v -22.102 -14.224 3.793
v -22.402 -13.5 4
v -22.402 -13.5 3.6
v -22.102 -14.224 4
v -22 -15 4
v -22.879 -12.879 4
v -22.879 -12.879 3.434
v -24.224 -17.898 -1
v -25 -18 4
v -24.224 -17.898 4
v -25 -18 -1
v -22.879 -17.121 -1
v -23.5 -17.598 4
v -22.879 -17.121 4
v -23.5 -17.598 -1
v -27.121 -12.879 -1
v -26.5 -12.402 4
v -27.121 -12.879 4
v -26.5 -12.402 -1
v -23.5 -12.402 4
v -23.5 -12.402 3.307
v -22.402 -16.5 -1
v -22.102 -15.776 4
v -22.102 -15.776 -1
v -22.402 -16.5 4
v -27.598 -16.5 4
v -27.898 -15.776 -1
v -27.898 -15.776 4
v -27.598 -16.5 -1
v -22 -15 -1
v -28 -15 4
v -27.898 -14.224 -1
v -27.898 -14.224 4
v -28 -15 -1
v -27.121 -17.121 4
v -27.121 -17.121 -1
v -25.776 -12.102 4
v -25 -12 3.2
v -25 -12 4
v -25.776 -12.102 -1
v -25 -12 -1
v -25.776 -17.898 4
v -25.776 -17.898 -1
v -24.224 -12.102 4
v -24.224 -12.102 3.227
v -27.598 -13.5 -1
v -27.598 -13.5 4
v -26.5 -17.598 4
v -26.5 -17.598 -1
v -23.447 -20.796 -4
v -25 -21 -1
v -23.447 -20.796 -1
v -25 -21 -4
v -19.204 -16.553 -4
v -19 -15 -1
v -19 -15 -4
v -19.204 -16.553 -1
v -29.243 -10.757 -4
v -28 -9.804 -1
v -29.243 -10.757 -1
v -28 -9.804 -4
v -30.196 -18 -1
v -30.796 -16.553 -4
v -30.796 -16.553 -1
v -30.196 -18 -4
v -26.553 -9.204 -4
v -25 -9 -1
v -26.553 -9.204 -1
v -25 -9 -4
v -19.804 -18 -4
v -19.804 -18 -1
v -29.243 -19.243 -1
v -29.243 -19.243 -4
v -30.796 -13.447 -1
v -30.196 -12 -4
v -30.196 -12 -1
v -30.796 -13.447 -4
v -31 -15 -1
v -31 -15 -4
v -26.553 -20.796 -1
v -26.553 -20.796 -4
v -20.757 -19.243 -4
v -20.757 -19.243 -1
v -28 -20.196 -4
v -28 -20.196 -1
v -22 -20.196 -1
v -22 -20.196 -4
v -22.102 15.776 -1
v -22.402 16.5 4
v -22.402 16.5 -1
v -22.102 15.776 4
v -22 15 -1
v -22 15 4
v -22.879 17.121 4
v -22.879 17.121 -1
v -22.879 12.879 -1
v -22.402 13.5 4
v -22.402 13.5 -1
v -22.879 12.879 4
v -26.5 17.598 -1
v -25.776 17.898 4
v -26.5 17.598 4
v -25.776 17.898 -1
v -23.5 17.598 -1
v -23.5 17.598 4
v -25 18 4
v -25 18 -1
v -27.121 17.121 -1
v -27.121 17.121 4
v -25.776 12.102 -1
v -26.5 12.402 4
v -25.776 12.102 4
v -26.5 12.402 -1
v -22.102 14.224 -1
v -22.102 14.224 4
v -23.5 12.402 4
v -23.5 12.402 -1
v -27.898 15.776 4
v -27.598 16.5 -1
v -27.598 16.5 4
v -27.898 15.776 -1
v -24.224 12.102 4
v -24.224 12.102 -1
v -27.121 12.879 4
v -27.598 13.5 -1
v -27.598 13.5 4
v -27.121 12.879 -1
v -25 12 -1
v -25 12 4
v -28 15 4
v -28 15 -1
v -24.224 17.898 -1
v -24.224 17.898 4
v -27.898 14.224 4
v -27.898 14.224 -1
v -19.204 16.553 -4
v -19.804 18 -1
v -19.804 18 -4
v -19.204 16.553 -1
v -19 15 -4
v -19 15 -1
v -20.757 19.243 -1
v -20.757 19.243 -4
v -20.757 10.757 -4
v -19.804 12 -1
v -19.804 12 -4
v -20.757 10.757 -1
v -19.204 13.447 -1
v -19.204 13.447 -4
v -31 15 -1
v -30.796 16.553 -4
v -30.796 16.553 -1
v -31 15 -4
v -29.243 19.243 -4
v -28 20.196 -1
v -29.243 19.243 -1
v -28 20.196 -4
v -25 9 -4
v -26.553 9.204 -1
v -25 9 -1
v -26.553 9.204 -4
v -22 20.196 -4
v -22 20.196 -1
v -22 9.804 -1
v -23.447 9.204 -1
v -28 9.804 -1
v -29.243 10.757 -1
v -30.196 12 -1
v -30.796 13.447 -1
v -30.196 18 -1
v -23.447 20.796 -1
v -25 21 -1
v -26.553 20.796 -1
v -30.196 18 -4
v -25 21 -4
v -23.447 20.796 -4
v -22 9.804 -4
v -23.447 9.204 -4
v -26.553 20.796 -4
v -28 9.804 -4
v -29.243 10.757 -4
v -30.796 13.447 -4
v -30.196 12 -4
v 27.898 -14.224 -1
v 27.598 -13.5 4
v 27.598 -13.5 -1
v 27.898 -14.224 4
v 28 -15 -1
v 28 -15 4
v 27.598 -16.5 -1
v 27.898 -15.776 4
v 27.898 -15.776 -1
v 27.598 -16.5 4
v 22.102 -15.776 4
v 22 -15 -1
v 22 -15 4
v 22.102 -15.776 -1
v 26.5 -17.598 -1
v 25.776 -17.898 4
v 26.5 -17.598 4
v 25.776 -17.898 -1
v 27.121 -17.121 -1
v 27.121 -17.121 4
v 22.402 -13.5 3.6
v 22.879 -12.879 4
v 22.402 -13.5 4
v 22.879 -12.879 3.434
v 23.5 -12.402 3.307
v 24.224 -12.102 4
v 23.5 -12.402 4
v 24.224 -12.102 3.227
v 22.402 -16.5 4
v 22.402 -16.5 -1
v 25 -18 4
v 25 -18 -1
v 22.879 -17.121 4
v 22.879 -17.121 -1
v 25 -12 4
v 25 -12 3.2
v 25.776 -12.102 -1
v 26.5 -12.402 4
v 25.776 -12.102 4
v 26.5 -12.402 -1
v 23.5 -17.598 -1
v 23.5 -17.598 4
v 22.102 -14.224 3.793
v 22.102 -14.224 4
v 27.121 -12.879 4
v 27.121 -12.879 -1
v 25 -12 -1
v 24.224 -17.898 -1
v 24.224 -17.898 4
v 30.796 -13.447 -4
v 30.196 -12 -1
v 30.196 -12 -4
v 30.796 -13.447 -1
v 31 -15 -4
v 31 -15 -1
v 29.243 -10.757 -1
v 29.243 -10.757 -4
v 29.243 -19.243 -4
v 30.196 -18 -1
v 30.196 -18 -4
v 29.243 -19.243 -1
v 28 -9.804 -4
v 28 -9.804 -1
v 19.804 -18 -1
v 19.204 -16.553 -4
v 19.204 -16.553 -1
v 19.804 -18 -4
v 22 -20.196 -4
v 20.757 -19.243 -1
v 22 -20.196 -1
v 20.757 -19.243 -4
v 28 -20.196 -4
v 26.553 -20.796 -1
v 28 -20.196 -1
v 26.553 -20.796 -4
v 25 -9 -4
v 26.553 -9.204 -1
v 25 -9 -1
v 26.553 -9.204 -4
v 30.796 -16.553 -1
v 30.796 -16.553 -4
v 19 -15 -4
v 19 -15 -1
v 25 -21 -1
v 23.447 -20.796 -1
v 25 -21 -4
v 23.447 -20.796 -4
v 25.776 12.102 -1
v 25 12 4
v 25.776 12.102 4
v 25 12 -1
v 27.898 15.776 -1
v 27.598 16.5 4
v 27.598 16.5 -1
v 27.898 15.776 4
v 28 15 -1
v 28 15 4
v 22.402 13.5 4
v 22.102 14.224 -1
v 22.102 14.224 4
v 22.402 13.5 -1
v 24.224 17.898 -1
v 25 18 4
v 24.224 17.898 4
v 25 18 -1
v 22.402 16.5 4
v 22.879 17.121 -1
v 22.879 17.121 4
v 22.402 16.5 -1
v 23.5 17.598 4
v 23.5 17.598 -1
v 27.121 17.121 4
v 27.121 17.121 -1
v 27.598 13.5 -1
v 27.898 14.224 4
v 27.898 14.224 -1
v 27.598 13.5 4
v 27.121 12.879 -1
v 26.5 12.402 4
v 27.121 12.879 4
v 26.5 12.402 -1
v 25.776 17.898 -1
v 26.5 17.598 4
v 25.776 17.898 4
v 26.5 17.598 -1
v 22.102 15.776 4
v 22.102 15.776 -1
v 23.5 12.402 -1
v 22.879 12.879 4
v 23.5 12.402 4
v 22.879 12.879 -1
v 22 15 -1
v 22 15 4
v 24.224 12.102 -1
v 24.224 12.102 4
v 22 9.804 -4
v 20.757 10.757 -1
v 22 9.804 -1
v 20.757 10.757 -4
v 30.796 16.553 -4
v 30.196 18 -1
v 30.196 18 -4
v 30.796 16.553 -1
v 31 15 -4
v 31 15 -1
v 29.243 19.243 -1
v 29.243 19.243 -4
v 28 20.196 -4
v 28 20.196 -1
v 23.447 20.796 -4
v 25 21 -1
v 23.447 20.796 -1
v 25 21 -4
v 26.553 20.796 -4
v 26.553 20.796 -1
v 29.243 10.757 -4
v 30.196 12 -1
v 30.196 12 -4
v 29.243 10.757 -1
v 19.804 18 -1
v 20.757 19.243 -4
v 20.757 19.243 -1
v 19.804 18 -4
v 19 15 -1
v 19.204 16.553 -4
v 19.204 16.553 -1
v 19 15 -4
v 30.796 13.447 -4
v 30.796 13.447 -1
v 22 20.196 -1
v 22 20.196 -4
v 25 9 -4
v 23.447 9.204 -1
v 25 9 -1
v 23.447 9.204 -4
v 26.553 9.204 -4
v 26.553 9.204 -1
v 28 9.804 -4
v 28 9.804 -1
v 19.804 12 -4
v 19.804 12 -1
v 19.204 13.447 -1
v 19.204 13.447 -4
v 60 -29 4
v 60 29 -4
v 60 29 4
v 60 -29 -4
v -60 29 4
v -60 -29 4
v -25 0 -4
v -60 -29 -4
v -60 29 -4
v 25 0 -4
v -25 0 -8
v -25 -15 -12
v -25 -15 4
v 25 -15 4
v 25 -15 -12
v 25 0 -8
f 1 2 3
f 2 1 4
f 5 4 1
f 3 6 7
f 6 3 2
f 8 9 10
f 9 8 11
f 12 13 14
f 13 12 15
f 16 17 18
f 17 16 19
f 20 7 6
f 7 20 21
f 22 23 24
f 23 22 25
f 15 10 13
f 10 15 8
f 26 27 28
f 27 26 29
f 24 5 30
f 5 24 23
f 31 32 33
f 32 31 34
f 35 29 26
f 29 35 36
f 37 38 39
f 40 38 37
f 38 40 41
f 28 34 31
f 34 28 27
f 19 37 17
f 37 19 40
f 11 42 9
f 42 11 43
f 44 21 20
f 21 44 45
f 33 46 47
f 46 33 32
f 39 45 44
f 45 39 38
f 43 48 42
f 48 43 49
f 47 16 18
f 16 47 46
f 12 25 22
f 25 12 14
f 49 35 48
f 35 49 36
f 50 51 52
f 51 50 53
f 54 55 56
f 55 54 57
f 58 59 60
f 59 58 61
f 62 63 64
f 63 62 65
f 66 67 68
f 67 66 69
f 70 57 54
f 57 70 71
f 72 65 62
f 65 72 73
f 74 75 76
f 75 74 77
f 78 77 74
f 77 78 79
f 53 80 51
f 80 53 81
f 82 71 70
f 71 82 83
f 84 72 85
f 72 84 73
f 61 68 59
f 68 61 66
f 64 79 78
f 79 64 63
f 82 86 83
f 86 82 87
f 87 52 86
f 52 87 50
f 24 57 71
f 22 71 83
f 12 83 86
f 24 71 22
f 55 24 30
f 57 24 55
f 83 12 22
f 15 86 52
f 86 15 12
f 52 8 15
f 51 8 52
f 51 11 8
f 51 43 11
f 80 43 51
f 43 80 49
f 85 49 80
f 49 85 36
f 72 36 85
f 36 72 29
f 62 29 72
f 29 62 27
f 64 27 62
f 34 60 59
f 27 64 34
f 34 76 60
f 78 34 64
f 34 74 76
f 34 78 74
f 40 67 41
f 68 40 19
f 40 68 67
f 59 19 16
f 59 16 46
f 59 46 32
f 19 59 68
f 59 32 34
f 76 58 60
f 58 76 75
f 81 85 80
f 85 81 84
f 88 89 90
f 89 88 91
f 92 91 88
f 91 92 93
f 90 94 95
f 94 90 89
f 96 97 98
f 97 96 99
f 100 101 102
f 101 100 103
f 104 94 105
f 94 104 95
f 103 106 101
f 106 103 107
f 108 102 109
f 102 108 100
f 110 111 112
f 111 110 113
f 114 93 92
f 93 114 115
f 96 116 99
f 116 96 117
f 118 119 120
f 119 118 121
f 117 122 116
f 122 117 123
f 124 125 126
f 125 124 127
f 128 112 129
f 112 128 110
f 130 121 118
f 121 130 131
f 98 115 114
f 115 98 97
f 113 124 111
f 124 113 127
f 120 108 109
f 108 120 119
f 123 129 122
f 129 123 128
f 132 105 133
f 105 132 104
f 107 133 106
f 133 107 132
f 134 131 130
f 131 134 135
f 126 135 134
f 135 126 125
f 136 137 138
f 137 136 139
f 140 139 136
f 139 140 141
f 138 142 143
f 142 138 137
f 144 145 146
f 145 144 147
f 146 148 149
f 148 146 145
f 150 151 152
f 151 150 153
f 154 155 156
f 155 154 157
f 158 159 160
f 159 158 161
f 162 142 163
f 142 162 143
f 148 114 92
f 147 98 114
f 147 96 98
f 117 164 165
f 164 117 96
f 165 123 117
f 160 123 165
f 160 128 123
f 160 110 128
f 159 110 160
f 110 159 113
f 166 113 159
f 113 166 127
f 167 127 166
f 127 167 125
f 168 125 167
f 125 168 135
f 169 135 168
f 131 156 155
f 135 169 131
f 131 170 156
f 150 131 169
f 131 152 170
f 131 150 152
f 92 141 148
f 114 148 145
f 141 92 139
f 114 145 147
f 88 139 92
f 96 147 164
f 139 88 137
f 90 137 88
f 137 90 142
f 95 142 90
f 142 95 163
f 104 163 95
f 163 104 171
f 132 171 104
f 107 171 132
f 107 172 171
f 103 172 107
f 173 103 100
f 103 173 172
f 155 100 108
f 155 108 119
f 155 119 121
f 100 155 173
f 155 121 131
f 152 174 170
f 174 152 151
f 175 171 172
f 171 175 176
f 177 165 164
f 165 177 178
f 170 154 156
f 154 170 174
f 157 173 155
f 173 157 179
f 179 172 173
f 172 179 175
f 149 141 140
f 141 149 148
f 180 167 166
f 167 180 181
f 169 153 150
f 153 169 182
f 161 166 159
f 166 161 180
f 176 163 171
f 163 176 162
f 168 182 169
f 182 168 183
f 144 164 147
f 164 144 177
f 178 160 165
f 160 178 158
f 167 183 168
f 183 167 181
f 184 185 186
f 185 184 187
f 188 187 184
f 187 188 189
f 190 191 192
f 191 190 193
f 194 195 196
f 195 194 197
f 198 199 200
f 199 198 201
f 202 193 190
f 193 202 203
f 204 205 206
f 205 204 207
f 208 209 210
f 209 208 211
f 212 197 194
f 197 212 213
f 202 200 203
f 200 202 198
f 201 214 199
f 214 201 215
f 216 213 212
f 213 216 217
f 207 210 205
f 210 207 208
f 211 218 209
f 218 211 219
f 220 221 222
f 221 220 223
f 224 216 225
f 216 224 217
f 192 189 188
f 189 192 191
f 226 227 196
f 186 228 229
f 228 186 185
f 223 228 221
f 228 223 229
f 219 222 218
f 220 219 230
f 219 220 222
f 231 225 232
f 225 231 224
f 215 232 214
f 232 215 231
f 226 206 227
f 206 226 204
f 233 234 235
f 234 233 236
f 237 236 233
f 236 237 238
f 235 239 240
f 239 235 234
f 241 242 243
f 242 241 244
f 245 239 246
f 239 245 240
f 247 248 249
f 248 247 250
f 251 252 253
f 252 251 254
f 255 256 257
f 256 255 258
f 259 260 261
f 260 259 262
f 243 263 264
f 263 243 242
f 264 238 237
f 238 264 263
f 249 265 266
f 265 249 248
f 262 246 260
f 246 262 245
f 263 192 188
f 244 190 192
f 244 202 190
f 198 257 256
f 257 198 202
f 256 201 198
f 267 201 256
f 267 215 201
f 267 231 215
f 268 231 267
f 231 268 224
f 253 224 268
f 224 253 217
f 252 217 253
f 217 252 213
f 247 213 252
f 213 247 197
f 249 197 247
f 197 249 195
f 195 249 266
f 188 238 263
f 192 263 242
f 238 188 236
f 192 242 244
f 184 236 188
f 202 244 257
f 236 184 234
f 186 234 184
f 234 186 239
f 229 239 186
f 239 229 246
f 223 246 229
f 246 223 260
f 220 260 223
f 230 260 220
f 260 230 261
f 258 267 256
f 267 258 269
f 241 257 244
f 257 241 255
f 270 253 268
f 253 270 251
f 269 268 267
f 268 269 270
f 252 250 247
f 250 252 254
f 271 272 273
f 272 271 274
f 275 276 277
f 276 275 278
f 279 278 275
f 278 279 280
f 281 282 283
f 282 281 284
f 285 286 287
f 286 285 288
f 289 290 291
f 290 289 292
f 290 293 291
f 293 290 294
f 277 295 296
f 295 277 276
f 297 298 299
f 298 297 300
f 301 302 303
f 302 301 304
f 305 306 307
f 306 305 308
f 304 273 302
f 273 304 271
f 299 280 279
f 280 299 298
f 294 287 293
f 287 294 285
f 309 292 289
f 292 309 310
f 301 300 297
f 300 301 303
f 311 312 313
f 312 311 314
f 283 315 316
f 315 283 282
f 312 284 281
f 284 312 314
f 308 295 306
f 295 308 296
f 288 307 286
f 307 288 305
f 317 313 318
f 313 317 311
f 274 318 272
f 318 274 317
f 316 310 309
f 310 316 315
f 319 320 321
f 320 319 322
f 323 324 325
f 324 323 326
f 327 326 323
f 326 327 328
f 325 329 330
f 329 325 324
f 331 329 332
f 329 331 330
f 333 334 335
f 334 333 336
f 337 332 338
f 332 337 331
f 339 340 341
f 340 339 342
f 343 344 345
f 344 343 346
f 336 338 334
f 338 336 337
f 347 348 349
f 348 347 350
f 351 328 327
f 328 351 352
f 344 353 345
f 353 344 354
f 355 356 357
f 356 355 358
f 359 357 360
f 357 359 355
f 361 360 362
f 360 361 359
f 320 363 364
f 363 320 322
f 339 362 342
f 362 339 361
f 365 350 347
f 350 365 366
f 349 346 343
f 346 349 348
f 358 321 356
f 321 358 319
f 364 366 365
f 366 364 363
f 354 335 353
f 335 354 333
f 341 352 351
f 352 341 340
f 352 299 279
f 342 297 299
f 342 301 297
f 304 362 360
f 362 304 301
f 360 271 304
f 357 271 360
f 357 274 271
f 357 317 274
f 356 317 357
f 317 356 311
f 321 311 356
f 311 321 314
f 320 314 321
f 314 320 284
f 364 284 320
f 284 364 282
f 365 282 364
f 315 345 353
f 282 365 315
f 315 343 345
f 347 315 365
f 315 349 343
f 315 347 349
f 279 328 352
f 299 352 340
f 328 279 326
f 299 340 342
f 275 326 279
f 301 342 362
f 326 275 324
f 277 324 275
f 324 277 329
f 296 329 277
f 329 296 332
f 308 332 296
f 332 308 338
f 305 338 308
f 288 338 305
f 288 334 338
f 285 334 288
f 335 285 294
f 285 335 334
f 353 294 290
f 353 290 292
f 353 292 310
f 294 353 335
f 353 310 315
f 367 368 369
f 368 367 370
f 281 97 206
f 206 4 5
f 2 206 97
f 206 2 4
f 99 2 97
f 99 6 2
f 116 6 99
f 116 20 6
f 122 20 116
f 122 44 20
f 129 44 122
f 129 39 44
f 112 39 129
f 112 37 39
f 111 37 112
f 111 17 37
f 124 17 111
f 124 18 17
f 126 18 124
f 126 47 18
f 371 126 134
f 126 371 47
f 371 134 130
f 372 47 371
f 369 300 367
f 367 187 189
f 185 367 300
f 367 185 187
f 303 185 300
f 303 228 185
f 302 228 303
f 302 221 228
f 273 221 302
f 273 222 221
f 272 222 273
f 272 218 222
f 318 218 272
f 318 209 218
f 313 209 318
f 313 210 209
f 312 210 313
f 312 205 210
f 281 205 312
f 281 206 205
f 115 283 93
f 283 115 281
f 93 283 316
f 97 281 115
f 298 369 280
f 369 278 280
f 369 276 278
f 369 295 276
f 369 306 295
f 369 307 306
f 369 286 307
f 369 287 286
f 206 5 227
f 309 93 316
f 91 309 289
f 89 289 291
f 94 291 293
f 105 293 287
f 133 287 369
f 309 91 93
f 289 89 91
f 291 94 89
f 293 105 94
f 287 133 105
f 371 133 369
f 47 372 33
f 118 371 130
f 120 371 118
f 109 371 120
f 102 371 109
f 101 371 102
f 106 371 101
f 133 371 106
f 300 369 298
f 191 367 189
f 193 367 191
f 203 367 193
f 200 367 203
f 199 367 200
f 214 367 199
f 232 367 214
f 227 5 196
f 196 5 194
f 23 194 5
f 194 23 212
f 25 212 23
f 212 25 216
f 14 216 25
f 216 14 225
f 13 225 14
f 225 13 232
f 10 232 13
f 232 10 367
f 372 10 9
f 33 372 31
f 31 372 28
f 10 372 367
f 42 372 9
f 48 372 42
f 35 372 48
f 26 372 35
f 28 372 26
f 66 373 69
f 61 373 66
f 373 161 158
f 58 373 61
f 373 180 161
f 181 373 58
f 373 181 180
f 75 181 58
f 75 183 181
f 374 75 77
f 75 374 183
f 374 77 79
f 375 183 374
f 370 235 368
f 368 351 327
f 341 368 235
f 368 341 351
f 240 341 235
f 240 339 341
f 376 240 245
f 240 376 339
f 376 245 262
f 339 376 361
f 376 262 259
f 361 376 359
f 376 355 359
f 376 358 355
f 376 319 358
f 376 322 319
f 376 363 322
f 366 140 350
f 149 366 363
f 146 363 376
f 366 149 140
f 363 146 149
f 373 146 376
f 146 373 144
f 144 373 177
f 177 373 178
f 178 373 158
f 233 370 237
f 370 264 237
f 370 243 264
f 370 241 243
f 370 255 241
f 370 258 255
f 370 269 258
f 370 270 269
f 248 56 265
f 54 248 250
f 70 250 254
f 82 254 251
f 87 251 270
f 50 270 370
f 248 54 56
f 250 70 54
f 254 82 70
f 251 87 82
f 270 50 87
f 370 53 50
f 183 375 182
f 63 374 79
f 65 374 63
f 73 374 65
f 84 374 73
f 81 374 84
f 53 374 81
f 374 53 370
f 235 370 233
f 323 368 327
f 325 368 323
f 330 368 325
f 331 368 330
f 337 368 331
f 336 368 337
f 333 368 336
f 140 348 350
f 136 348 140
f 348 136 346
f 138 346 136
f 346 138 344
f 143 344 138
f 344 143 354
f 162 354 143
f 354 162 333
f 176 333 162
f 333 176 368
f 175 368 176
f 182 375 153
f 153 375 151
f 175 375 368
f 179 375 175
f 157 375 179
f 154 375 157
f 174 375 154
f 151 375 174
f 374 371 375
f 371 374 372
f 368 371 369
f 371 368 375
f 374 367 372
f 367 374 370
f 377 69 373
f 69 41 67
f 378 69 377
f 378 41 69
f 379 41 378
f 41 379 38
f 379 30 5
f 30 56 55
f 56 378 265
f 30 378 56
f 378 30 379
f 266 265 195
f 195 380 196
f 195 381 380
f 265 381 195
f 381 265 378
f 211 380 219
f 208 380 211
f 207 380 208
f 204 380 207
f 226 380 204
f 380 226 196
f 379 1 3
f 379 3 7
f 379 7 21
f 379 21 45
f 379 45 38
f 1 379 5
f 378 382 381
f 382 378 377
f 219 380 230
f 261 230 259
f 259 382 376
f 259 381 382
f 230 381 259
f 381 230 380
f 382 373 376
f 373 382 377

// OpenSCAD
// ===== PARAMETERS =====

// Mounting plate dimensions
plate_length = 120;        // Length of bracket plate (X)
plate_width = 58;          // Width of bracket plate (Y)
plate_thickness = 8;       // Thickness of plate (Z)

// Screw hole pattern
hole_pattern_length = 50;  // X distance between holes
hole_pattern_width = 30;   // Y distance between holes
hole_diameter = 6;         // Hole diameter
nut_recess_diameter = 12;  // Nut head recess diameter
screw_material = 5;        // Material for screw threads

// Dovetail dimensions
dovetail_length = 50;      // Length of dovetail rail - how far to slide on (along Y)
dovetail_top_width = 8;    // Width at top (narrow, attached to plate)
dovetail_bottom_width = 16; // Width at bottom (wide, the catch)
dovetail_height = 15;      // How far dovetail drops below plate

// Rendering
$fn = 32;

// ===== HELPERS =====
function hole_offset_x() = hole_pattern_length / 2;
function hole_offset_y() = hole_pattern_width / 2;

// ===== MODULES =====

// Dovetail profile (2D) - trapezoidal cross-section
// X = drop distance (becomes -Z after rotation, hanging down)
// Y = trapezoid width (narrow at top, wide at bottom)
module dovetail_profile_2d(
    top_w = dovetail_top_width,
    bottom_w = dovetail_bottom_width,
    height = dovetail_height
) {
    polygon([
        [0, -top_w/2],
        [0, top_w/2],
        [height, bottom_w/2],
        [height, -bottom_w/2]
    ]);
}

// Mount bracket with screw holes and dovetail rail
module mount_bracket() {
    recess_depth = plate_thickness - screw_material;

    // Main plate with screw holes
    difference() {
        cube([plate_length, plate_width, plate_thickness], center=true);

        off_x = hole_offset_x();
        off_y = hole_offset_y();

        for (dx = [-1, 1]) {
            for (dy = [-1, 1]) {
                // Through hole for screw
                translate([dx * off_x, dy * off_y, -plate_thickness/2 - 1])
                    cylinder(h = plate_thickness + 2, d = hole_diameter, $fn=24);

                // Nut recess from bottom
                translate([dx * off_x, dy * off_y, -plate_thickness/2 - 1])
                    cylinder(h = recess_depth + 1, d = nut_recess_diameter, $fn=24);
            }
        }
    }

    // Dovetail rail extending down from bottom of plate, running along Y
    // After rotate([-90,0,-90]): extrusion→Y, profile X→-Z (down), profile Y→X (width)
    translate([0, 0, -plate_thickness/2])
        rotate([-90, 0, -90])
            linear_extrude(height = dovetail_length, center = true)
                dovetail_profile_2d();
}

// ===== RENDER =====
mount_bracket();
